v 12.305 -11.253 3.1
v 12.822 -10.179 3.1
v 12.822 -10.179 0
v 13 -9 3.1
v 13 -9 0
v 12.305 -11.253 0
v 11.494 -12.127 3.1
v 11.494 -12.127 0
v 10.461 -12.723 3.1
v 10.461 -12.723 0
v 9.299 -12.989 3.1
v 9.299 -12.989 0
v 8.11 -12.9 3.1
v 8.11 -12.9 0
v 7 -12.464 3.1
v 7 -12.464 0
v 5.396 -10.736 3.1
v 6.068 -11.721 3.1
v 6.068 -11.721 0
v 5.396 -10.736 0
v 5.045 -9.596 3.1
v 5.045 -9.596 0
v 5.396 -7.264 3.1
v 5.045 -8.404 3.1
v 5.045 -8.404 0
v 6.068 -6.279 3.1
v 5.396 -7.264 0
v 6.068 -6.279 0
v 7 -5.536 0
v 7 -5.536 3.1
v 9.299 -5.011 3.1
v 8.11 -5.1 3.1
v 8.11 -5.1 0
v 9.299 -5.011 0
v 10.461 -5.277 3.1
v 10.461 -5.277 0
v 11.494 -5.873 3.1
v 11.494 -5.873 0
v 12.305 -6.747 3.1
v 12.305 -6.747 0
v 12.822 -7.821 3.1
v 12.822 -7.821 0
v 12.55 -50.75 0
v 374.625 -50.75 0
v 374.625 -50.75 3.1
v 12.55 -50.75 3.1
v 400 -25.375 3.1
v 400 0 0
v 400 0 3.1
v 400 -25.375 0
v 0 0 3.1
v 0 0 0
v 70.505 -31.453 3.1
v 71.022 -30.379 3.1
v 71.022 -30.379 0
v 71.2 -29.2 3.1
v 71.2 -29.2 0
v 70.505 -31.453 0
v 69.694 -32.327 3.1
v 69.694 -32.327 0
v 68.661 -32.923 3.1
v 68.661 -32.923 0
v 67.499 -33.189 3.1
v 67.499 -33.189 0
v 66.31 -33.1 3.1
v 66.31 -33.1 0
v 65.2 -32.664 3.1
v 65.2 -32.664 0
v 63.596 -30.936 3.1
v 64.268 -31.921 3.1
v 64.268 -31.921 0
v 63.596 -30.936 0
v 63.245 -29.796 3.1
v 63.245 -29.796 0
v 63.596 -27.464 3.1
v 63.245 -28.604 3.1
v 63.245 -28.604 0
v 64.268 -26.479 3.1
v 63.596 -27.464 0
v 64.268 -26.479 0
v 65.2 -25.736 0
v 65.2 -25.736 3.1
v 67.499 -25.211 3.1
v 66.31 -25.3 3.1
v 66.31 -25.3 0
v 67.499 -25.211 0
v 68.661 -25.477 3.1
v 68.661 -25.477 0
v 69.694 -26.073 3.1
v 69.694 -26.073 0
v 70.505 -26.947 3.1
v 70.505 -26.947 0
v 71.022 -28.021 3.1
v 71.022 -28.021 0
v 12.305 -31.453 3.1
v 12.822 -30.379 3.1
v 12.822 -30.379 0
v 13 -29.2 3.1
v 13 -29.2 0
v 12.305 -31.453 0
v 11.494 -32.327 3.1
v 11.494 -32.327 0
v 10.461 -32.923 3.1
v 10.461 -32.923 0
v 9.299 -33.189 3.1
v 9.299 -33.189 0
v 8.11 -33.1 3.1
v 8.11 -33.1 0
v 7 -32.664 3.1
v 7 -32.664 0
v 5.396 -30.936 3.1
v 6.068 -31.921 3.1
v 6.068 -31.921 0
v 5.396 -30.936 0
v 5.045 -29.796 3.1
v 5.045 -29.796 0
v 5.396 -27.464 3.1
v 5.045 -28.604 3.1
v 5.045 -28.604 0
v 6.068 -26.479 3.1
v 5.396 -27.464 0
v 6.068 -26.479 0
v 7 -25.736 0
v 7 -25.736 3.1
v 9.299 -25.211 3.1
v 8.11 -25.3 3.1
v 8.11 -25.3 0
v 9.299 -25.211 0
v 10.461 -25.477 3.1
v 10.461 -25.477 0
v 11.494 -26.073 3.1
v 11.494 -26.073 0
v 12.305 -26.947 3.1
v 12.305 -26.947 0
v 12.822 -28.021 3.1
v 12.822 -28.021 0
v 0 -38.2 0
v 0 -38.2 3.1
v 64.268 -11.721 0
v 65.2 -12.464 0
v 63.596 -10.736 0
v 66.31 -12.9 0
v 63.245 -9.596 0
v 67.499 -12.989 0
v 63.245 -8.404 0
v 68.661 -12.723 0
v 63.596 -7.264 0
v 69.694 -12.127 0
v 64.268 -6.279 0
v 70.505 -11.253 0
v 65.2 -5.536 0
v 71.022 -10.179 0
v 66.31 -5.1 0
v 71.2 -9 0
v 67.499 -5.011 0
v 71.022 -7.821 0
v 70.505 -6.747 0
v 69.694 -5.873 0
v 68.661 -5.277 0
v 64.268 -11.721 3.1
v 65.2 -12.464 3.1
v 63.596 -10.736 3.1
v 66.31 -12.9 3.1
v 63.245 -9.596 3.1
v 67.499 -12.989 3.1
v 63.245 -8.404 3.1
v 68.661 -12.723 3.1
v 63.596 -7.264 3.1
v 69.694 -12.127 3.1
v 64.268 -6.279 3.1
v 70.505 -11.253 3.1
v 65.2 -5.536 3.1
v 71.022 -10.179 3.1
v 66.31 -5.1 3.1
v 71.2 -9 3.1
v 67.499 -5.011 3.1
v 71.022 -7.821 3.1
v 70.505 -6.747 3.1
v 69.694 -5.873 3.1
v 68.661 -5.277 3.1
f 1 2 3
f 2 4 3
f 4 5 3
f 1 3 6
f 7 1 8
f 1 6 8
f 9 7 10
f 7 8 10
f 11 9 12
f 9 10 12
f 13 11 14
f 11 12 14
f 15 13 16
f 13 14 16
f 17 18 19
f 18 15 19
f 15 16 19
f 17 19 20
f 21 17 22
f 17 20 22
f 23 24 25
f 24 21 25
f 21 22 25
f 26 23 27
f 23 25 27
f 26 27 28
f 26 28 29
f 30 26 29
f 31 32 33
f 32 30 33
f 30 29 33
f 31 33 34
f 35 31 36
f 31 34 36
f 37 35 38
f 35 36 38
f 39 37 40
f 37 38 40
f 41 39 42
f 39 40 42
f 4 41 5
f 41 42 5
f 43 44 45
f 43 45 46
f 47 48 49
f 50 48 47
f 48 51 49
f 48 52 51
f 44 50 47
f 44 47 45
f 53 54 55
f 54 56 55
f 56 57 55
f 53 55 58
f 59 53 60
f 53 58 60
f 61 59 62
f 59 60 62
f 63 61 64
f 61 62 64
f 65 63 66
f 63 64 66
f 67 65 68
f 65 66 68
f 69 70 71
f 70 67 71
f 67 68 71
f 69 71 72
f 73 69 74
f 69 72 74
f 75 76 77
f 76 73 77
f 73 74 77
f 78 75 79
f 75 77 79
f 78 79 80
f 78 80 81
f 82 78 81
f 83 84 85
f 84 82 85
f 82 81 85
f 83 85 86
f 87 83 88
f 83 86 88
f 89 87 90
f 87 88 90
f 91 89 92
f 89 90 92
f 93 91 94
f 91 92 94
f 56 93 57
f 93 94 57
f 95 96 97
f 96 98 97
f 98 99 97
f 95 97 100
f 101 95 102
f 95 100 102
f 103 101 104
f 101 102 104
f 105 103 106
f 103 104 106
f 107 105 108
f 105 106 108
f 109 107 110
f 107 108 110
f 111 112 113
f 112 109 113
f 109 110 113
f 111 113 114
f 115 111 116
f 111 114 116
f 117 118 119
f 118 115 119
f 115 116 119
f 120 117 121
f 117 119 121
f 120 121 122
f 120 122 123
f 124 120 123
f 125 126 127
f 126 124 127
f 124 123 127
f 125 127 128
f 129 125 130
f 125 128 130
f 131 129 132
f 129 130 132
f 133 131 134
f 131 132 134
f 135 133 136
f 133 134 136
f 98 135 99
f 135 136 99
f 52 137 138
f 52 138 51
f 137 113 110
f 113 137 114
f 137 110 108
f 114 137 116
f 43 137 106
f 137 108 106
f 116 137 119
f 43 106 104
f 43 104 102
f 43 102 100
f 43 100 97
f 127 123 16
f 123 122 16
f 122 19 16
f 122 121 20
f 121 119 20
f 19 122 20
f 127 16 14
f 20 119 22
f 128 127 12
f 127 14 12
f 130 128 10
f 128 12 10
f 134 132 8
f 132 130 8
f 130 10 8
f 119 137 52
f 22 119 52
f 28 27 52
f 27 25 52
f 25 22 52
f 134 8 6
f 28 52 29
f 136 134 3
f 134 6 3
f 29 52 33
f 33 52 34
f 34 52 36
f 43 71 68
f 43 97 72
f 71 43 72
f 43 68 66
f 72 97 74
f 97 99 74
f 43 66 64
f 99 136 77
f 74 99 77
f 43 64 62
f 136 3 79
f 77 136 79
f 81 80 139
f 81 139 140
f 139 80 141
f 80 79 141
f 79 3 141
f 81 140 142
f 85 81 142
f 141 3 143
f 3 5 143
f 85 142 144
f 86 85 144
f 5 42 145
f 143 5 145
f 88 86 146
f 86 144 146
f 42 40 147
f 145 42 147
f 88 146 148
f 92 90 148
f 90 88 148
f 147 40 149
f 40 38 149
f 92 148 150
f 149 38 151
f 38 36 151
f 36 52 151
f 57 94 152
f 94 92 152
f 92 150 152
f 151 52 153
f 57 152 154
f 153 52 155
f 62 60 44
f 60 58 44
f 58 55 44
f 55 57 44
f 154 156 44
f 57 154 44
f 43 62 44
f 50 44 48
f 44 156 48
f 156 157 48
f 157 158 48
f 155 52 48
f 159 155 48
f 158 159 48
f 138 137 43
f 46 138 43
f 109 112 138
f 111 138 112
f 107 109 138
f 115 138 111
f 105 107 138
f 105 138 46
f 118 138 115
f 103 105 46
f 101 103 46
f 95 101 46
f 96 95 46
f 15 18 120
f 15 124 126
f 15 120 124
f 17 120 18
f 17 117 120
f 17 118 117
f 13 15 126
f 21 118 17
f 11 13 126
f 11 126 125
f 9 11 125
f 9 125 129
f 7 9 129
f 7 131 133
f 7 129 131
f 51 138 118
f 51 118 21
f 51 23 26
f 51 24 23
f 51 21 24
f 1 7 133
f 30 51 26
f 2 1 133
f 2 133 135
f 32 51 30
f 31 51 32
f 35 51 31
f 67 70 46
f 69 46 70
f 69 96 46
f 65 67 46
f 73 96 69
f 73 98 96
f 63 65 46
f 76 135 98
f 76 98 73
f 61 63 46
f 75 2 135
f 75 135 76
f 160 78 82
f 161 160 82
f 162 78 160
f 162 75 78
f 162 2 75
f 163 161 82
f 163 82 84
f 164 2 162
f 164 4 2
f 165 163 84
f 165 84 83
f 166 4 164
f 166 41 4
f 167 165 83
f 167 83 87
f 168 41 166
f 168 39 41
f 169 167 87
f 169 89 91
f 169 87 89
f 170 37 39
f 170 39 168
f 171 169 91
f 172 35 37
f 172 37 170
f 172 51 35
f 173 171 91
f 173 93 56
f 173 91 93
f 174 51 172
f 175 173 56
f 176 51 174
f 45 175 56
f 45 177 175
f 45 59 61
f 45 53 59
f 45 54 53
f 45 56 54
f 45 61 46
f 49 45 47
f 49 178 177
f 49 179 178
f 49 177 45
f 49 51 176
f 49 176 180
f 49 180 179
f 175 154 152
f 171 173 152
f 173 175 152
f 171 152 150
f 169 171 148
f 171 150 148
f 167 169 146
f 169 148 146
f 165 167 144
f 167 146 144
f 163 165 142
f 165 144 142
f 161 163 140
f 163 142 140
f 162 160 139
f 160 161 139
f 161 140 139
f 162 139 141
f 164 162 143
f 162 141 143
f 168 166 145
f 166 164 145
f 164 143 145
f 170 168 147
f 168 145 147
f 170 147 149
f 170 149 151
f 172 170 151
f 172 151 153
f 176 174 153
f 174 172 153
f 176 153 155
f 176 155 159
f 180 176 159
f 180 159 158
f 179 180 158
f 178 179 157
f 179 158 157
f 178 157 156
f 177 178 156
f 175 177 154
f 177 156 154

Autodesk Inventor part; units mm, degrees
ref_plane "YZ Plane" through (0, 0, 0) normal (1, 0, 0) x (0, 1, 0)
ref_plane "XZ Plane" through (0, 0, 0) normal (0, 1, 0) x (-1, 0, 0)
ref_plane "XY Plane" through (0, 0, 0) normal (0, 0, 1) x (1, 0, 0)
sketch "Sketch1" plane through (0, 0, 0) normal (0, 0, 1) x (1, 0, 0)
  line L0 (0, 0) -> (400, 0)
  line L1 (400, 0) -> (400, -25.375)
  line L2 (0, -38.2) -> (12.55, -50.75)
  line L3 (400, -25.375) -> (374.625, -50.75)
  line L4 (0, -38.2) -> (0, 0)
  line L5 (374.625, -50.75) -> (12.55, -50.75)
  circle A0 centre (9, -9) radius 4
  circle A1 centre (9, -29.2) radius 4
  circle A2 centre (67.2, -9) radius 4
  circle A3 centre (67.2, -29.2) radius 4
  dimension "d3" = 8
  dimension "d4" = 8
  dimension "d5" = 8
  dimension "d6" = 8
  dimension "d10" = 9
  dimension "d11" = 9
  dimension "d12" = 9
  dimension "d13" = 9
  dimension "d15" = 20.2
  dimension "d16" = 58.2
  dimension "d18" = 12.55
  dimension "d19" = 400
  dimension "d20" = 50.75
  dimension "d21" = 25.375
  dimension "d22" = 20.2
  dimension "d23" = 58.2
  dimension "d24" = 12.55
  dimension "d25" = 25.375
extrude "Extrusion1" add sketch "Sketch1" along normal blind 3.1
properties part number "SideBracket" material "Steel, Mild"
